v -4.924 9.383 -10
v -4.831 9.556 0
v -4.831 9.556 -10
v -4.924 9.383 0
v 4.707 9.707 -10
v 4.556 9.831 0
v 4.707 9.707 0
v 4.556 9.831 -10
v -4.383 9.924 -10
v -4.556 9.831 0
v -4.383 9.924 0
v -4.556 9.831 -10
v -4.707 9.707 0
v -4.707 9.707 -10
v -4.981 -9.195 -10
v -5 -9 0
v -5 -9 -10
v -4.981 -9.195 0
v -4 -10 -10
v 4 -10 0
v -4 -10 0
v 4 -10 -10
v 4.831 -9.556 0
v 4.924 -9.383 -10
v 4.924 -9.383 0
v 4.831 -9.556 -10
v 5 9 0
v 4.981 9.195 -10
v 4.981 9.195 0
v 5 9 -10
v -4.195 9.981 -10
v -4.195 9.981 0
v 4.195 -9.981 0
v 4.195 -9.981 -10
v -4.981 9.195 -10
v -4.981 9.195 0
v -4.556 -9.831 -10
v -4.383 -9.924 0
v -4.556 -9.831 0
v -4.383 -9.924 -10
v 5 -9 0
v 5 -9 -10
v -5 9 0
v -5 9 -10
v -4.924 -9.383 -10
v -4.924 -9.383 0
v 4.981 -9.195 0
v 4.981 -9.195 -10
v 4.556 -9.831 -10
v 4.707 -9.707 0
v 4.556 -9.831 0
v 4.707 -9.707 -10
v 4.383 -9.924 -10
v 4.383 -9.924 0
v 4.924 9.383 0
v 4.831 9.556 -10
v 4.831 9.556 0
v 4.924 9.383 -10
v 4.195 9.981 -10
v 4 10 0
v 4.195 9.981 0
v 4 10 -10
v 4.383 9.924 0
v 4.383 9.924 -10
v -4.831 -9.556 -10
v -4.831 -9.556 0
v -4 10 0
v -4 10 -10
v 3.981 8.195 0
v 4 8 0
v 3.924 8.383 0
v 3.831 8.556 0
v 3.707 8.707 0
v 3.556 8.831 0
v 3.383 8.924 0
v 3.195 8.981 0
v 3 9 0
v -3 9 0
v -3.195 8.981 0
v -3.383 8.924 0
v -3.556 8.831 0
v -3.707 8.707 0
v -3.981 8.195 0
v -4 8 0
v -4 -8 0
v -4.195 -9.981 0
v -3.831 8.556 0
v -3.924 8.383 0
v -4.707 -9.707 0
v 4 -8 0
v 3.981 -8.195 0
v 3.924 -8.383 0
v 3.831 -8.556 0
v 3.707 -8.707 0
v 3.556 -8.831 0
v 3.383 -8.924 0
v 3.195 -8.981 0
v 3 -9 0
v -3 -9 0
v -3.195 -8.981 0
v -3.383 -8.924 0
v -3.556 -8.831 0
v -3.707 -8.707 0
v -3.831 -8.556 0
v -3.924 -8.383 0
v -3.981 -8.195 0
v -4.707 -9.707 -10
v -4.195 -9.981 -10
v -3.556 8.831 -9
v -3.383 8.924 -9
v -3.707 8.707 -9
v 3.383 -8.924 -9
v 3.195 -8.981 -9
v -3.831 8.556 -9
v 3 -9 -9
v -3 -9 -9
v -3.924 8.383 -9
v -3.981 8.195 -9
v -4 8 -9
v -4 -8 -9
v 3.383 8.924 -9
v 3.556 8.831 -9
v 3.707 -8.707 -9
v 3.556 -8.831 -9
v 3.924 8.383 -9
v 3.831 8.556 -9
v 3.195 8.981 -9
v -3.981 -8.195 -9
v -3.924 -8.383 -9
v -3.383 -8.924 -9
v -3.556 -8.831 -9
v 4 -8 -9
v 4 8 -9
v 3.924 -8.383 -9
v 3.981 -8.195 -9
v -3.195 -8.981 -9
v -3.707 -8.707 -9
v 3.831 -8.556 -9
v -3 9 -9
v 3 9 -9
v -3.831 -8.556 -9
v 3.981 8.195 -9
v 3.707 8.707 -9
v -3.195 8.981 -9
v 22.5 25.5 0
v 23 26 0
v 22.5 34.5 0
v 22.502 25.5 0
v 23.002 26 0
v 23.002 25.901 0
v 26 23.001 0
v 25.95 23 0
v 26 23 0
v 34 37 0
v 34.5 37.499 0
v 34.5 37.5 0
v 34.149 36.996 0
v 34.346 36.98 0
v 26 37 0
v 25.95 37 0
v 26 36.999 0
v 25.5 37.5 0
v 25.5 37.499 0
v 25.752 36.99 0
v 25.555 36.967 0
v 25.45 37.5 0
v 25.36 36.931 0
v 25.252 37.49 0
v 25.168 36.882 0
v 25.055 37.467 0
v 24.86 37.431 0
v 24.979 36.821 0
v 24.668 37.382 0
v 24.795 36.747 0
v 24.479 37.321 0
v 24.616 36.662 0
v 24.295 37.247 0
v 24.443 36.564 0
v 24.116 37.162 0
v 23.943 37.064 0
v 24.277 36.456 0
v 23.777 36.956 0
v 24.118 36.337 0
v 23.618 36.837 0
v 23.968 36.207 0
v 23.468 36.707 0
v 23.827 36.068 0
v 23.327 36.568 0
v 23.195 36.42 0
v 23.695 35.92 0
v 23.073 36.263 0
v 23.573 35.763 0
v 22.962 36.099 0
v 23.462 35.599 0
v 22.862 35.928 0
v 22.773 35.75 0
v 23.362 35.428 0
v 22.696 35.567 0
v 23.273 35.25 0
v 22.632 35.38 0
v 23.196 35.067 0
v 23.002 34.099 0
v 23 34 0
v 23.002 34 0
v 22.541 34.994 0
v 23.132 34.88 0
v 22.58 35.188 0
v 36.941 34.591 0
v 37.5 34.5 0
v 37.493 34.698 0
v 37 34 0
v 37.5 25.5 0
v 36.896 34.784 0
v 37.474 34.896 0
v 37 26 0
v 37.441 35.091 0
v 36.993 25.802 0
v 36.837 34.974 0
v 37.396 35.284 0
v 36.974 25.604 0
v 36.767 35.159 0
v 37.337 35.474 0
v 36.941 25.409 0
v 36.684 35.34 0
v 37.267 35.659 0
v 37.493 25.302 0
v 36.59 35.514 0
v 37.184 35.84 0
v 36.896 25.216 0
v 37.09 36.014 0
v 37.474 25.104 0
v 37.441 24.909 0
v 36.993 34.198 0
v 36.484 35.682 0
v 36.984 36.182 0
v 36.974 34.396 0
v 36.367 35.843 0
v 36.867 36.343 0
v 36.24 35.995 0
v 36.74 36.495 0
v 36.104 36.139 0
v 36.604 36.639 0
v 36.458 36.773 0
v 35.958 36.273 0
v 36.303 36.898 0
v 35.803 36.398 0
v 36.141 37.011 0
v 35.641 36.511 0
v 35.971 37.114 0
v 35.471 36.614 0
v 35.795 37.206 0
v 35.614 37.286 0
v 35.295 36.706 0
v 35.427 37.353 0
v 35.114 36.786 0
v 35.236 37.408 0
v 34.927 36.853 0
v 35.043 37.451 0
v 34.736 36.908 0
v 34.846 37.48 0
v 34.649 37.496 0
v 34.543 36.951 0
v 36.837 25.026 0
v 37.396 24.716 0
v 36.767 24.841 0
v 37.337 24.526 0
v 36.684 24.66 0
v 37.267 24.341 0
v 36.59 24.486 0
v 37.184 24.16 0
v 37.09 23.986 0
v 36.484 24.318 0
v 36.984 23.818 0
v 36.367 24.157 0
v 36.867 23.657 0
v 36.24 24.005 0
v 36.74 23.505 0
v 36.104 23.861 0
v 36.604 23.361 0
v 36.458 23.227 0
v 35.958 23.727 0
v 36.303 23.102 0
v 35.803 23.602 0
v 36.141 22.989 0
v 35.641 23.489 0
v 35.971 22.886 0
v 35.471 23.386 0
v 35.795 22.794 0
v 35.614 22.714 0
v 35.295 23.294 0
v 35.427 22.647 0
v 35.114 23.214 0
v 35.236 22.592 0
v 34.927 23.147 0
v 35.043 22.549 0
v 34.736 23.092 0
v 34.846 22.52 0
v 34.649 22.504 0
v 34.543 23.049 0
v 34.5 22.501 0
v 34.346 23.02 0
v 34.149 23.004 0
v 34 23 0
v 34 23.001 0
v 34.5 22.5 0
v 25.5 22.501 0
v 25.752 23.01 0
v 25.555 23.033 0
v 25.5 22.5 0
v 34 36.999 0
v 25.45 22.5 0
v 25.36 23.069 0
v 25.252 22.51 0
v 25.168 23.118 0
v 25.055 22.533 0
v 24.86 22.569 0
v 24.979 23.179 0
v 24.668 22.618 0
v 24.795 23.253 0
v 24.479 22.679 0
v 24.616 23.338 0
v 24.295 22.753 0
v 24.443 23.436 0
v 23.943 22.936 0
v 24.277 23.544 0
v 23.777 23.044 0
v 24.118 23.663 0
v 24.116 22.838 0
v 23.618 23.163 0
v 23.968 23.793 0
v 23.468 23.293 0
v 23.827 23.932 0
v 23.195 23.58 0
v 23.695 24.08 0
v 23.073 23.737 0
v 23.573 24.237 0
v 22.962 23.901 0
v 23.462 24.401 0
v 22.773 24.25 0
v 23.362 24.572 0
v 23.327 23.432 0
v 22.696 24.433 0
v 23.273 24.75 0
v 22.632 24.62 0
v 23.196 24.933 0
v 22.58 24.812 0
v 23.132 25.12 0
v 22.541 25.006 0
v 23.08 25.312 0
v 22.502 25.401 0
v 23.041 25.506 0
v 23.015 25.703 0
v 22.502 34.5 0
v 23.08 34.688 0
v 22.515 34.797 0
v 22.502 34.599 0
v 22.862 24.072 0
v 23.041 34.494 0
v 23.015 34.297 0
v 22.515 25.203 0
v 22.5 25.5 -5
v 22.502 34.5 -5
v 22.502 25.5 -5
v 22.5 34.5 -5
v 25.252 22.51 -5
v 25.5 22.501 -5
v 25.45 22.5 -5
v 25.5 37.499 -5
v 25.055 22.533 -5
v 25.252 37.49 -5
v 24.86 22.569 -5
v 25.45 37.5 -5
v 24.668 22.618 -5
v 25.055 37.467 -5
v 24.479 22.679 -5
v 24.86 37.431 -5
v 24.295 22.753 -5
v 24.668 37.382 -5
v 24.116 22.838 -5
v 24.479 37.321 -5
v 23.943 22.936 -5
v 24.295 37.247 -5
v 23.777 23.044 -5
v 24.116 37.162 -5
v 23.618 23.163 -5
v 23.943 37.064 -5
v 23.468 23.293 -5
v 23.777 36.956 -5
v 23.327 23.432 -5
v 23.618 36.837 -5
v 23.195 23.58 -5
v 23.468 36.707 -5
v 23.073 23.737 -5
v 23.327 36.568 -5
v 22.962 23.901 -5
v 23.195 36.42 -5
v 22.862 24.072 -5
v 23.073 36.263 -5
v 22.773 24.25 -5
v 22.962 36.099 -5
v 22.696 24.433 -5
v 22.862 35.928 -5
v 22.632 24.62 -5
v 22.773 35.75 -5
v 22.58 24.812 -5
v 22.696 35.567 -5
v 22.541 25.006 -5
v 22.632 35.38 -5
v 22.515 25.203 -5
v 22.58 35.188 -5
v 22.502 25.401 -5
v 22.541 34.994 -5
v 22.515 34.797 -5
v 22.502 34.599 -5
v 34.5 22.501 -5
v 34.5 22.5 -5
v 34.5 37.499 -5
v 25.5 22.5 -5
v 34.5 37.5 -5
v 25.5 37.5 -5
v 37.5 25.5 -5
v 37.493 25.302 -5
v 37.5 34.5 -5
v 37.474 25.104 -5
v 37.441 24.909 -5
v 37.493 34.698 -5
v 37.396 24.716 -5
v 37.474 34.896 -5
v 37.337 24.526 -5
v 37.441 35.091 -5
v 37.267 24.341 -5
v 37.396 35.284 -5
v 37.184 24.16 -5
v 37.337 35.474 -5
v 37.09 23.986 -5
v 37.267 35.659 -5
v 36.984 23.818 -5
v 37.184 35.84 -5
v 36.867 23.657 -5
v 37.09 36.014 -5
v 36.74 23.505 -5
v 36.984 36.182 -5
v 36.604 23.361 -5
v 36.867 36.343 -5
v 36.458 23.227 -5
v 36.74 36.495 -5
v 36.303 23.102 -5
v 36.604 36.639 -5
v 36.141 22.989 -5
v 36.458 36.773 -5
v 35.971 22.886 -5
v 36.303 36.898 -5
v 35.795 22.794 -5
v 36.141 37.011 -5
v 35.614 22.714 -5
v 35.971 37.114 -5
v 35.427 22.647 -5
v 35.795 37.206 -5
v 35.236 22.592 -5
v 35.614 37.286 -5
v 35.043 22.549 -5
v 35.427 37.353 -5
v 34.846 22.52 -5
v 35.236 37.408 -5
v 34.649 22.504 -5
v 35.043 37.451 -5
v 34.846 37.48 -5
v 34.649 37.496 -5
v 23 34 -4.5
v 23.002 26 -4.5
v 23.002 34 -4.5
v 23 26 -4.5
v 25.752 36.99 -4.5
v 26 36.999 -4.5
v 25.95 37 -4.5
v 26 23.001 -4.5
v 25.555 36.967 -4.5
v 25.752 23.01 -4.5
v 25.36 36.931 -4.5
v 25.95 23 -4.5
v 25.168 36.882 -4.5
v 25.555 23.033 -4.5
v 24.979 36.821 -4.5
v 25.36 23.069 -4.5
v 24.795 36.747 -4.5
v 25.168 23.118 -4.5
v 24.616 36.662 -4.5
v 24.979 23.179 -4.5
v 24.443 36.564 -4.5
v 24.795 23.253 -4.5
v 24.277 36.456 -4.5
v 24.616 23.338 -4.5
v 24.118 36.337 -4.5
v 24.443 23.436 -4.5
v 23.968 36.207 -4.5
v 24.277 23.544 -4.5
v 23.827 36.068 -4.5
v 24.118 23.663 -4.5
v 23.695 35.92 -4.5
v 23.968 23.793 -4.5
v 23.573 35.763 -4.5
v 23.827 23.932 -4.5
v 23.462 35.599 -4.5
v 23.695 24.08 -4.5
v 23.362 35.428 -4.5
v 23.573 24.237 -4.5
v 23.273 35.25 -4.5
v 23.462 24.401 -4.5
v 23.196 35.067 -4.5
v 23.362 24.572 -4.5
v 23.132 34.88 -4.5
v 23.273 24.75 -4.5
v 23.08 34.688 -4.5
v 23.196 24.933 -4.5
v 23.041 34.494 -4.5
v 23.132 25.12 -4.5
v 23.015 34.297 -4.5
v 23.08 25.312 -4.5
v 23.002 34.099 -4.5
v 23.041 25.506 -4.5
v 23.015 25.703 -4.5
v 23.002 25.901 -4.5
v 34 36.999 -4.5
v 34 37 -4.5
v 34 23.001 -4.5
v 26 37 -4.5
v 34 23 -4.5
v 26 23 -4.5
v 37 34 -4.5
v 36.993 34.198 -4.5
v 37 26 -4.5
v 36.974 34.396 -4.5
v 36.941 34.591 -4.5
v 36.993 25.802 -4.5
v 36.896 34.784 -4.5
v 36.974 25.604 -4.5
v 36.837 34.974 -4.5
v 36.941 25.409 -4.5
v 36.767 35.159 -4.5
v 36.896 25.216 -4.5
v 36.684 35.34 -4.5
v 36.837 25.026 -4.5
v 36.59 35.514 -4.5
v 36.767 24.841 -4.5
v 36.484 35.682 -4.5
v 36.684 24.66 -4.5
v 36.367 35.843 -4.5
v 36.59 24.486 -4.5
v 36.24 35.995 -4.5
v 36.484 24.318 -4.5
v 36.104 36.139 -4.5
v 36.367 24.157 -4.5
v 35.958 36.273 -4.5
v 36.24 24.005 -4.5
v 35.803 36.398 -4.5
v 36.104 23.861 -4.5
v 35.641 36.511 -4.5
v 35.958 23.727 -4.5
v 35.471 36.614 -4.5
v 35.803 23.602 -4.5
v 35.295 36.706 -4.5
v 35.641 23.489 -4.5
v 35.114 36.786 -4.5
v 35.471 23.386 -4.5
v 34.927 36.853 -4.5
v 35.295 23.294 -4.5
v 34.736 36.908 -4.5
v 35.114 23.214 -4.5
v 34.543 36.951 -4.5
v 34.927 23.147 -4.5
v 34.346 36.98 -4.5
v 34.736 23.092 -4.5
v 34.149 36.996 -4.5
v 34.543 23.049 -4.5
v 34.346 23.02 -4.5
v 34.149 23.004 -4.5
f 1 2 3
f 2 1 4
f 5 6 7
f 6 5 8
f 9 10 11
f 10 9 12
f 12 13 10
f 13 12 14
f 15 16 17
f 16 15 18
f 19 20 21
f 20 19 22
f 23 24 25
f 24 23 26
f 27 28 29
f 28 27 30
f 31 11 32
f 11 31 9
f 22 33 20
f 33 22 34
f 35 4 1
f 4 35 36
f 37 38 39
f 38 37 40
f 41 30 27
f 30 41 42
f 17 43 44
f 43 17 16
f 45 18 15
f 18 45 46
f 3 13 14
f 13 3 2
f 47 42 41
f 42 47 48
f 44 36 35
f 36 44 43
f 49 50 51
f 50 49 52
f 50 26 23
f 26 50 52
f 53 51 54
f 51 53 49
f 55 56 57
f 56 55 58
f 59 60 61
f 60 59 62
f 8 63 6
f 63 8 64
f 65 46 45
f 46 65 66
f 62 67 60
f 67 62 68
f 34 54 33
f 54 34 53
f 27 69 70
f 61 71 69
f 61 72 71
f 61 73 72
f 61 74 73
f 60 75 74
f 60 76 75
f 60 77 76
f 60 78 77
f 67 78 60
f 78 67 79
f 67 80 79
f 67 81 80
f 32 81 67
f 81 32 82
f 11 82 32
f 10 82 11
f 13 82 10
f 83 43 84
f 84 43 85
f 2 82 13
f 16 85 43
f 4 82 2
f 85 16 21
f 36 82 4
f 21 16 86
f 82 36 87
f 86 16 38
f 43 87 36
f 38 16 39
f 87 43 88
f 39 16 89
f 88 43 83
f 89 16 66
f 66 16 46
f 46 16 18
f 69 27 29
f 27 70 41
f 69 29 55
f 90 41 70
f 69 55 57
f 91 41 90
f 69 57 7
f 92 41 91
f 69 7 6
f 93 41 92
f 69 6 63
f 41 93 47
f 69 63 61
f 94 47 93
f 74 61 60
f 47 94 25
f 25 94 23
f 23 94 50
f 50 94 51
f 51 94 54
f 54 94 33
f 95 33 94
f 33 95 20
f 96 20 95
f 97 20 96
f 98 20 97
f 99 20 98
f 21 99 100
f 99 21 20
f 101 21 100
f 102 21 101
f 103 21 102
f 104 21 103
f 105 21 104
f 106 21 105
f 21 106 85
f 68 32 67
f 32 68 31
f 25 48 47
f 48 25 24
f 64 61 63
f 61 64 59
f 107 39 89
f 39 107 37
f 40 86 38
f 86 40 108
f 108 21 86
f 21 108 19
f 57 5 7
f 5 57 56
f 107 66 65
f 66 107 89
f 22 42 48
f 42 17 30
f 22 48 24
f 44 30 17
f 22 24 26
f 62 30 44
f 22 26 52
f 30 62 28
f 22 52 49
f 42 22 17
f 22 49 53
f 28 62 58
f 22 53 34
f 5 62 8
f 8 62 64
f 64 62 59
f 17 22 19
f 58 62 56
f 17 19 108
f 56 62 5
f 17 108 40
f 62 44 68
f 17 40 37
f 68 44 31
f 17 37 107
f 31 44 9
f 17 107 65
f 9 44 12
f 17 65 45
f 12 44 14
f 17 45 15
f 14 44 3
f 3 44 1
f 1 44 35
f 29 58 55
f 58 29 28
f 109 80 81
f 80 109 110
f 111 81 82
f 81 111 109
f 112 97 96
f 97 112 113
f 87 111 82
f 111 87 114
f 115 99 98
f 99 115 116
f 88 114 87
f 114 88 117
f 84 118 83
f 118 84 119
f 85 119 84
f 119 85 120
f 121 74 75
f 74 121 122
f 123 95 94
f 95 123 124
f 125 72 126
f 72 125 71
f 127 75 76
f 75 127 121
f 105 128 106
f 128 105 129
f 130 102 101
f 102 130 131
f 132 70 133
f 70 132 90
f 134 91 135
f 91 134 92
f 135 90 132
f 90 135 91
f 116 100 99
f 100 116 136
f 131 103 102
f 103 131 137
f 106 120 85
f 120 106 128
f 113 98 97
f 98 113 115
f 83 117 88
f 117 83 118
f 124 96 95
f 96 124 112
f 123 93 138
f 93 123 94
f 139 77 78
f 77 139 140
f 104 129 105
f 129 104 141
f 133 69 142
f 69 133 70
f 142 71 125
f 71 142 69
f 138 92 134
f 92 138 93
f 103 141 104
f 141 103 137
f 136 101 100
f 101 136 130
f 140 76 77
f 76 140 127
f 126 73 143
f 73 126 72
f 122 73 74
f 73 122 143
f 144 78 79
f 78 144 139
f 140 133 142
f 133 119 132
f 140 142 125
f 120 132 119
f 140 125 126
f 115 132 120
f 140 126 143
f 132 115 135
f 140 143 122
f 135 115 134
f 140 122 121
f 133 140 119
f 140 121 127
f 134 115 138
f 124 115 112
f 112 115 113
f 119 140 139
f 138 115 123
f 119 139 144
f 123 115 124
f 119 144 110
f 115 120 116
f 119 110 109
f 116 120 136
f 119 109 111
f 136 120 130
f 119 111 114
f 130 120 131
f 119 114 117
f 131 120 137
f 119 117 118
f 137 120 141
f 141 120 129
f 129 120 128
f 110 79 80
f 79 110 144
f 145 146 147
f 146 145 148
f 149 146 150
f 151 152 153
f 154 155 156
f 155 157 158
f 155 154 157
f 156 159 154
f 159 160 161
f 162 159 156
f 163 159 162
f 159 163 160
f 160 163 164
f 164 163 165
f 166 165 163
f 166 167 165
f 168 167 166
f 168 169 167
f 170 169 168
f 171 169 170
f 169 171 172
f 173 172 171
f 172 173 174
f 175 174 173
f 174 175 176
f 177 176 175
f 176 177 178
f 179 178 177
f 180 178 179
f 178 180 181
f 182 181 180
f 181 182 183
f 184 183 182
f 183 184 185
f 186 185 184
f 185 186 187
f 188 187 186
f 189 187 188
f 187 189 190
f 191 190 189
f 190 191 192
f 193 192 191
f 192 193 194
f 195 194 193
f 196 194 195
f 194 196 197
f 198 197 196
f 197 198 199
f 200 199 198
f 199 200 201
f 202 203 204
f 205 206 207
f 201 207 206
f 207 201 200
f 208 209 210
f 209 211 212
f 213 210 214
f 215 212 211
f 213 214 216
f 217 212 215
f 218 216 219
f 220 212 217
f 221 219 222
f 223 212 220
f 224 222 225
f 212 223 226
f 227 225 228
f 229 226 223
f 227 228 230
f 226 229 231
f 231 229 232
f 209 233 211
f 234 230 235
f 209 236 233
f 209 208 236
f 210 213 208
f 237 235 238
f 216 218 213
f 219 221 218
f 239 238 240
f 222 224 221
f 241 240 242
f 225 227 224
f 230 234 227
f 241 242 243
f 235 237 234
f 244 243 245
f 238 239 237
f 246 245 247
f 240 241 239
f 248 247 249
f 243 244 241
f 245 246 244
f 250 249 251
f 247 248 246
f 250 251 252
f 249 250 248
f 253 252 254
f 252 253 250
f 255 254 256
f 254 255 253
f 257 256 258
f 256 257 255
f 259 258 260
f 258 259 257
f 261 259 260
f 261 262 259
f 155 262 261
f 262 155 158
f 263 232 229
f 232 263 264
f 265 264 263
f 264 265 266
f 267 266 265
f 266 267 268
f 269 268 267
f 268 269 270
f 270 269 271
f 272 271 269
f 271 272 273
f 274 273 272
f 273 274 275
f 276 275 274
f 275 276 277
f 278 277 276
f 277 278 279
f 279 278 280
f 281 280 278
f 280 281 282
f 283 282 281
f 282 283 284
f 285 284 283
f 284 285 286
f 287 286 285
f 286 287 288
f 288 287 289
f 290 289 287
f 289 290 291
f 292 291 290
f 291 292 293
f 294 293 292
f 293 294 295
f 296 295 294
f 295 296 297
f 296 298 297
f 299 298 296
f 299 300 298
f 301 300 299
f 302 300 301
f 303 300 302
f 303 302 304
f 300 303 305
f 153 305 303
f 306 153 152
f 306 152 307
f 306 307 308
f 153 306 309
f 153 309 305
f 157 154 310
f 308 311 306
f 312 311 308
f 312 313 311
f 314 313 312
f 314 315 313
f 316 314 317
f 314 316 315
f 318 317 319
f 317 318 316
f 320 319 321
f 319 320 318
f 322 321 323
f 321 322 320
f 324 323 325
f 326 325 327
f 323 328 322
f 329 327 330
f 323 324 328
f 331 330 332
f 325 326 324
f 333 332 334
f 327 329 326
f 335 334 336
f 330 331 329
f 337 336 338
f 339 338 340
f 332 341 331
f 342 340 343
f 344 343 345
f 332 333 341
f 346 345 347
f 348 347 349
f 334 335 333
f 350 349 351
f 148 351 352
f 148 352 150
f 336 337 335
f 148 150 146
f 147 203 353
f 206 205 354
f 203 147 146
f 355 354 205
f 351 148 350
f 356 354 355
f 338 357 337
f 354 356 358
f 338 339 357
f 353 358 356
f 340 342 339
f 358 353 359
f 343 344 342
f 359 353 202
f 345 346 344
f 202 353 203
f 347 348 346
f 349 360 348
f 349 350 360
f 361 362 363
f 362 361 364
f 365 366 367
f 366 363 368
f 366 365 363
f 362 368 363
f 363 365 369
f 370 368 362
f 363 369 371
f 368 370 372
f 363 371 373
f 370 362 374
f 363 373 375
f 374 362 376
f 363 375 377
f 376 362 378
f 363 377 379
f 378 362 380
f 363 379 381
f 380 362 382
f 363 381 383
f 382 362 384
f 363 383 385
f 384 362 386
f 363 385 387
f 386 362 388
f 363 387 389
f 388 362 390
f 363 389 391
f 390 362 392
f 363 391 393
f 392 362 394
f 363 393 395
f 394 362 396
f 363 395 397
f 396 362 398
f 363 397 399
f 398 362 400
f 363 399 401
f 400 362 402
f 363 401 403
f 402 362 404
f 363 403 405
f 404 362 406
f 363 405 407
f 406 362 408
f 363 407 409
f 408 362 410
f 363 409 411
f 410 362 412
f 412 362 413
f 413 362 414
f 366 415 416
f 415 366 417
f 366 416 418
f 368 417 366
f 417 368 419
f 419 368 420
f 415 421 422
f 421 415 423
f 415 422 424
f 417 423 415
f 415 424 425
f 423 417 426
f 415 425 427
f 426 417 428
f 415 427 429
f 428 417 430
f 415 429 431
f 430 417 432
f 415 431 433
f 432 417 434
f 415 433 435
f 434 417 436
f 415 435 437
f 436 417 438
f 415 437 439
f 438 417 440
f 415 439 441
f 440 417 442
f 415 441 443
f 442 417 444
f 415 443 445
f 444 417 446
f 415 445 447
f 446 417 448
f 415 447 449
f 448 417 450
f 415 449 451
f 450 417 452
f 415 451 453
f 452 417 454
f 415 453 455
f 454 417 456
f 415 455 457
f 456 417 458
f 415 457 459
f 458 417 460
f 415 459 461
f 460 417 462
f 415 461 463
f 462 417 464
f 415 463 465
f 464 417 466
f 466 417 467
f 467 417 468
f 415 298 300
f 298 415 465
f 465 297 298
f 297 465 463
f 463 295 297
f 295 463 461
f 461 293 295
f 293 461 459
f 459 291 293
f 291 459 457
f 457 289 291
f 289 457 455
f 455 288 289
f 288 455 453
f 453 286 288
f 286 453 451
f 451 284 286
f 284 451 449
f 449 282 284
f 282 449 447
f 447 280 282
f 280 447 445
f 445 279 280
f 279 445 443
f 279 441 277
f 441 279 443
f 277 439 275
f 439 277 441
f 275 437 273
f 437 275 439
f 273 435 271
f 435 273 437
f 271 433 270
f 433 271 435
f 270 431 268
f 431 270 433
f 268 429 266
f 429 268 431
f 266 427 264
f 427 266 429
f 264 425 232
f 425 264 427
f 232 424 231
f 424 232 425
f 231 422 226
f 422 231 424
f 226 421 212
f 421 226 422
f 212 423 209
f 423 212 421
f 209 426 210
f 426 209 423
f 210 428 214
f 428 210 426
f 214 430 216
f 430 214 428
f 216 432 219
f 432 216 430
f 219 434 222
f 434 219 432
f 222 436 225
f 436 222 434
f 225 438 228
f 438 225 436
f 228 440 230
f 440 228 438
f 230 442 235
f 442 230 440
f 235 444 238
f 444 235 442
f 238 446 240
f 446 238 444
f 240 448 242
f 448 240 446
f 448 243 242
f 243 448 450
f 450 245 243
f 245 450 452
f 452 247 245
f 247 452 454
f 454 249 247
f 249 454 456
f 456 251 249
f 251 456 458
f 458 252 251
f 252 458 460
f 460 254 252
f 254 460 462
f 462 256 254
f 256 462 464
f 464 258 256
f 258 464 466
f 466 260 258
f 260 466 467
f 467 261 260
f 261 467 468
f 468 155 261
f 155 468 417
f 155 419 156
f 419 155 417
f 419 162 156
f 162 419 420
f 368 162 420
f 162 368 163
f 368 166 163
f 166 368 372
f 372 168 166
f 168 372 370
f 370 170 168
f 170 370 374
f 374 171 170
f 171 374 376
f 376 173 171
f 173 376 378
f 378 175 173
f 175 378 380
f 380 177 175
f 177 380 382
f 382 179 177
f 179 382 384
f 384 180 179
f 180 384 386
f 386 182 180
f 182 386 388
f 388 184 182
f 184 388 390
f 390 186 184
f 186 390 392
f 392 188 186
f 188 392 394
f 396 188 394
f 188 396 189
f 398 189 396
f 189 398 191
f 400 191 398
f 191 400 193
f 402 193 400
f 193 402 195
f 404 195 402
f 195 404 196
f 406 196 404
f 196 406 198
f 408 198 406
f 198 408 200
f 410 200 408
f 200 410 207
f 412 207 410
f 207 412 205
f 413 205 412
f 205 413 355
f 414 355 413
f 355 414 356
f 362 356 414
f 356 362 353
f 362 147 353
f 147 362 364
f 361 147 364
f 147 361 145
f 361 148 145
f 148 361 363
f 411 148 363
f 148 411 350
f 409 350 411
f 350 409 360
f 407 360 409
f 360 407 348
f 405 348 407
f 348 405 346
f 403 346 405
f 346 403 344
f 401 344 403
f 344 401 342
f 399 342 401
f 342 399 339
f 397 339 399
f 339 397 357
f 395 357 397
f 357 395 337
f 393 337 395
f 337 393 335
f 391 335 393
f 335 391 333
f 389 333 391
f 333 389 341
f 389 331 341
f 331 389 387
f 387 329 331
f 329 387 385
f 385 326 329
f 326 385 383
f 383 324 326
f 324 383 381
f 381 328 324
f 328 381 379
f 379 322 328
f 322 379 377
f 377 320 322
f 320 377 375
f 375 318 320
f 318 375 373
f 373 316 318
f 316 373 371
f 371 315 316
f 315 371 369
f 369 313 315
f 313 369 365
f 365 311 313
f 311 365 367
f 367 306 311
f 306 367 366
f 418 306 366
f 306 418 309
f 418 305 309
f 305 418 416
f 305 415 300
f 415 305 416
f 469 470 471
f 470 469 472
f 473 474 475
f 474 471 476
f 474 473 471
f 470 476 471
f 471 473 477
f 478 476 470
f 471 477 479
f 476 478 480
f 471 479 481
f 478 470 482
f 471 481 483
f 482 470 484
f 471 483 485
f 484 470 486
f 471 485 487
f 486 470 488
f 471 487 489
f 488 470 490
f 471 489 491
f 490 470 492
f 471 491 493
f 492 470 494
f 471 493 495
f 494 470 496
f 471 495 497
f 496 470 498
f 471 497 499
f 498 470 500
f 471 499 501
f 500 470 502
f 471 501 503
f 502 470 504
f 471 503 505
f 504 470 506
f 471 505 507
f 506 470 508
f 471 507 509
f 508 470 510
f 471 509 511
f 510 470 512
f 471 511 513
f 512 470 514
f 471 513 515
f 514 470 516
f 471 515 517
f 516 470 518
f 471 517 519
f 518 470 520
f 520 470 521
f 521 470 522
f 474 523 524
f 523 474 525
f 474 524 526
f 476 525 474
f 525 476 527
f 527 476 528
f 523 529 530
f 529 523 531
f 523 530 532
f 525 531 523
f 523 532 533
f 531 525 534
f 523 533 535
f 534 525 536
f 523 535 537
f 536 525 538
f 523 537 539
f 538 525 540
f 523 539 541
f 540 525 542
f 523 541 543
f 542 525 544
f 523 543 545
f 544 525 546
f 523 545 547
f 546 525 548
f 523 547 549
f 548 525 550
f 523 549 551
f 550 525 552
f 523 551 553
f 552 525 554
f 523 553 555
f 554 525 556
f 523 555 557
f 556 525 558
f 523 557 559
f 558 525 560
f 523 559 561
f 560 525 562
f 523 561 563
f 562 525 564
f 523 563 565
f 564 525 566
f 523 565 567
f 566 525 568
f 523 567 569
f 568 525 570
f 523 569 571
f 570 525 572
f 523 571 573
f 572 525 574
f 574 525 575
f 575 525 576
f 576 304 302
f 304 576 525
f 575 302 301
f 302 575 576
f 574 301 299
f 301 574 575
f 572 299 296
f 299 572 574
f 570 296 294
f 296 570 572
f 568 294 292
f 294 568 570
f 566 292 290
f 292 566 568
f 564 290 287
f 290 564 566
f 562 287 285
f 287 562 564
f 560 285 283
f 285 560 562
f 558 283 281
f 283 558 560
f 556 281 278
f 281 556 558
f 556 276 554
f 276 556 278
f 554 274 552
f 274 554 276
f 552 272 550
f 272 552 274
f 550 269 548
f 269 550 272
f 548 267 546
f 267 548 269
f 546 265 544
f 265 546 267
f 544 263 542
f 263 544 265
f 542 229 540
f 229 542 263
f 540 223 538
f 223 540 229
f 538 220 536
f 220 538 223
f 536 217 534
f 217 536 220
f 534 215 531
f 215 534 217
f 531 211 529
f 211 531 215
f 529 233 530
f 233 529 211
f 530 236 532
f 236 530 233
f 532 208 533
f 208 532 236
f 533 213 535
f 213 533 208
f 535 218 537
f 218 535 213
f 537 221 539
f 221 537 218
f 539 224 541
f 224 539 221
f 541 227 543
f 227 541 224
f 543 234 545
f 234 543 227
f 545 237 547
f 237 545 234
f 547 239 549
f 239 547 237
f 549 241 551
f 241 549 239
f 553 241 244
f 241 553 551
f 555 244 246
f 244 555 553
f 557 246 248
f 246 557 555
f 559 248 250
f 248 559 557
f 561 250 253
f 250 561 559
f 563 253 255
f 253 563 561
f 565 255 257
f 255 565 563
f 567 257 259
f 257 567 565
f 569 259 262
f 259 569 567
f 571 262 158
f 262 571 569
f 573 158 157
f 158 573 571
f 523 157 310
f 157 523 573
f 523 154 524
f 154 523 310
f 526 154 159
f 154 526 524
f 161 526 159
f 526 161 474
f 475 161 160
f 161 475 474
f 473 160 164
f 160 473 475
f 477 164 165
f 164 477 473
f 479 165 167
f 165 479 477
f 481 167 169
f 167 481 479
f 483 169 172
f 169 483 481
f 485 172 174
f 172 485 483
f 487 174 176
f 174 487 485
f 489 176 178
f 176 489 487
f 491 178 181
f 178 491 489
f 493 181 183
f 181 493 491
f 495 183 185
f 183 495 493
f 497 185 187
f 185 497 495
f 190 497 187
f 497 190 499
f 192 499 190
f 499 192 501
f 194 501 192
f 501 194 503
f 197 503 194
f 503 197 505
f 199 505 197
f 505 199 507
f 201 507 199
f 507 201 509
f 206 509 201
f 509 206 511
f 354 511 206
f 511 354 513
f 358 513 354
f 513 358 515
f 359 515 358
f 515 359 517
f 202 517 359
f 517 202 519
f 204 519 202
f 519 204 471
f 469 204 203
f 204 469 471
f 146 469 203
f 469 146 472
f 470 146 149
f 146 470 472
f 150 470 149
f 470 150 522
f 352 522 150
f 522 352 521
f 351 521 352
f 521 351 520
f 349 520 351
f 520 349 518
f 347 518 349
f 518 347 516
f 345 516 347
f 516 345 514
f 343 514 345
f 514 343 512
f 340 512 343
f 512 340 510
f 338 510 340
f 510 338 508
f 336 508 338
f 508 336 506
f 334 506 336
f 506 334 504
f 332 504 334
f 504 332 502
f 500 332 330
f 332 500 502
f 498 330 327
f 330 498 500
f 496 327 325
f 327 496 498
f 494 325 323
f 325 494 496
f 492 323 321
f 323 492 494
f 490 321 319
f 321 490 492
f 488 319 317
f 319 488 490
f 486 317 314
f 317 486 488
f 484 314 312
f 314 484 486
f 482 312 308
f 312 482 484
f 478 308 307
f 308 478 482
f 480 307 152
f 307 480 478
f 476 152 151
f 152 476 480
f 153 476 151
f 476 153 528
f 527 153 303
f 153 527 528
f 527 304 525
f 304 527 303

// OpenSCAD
$fa=0.5;
$fs=0.2;

module rounded_rectangle(l, w, r) {
  union() {
    square([l-2*r, w], center=true);
    square([l, w-2*r], center=true);
    translate([l/2-r, w/2-r]) circle(r=r);
    translate([-l/2+r, w/2-r]) circle(r=r);
    translate([-l/2+r, -w/2+r]) circle(r=r);
    translate([l/2-r, -w/2+r]) circle(r=r);
  }
}

module box(l, w, h, r, thickness) {
  difference() {
    scale([1,1,-1])
      linear_extrude(height=h)
        rounded_rectangle(l, w, r);
    scale([1,1,-1])
      translate([0,0,-thickness])
        linear_extrude(height=h)
          rounded_rectangle(l-thickness*2, w-thickness*2, r);
  }
}

// Small box
box(10, 20, 10, 1, 1);

// Bigger box
translate([30, 30, 0])
  box(15, 15, 5, 3, 0.5);
